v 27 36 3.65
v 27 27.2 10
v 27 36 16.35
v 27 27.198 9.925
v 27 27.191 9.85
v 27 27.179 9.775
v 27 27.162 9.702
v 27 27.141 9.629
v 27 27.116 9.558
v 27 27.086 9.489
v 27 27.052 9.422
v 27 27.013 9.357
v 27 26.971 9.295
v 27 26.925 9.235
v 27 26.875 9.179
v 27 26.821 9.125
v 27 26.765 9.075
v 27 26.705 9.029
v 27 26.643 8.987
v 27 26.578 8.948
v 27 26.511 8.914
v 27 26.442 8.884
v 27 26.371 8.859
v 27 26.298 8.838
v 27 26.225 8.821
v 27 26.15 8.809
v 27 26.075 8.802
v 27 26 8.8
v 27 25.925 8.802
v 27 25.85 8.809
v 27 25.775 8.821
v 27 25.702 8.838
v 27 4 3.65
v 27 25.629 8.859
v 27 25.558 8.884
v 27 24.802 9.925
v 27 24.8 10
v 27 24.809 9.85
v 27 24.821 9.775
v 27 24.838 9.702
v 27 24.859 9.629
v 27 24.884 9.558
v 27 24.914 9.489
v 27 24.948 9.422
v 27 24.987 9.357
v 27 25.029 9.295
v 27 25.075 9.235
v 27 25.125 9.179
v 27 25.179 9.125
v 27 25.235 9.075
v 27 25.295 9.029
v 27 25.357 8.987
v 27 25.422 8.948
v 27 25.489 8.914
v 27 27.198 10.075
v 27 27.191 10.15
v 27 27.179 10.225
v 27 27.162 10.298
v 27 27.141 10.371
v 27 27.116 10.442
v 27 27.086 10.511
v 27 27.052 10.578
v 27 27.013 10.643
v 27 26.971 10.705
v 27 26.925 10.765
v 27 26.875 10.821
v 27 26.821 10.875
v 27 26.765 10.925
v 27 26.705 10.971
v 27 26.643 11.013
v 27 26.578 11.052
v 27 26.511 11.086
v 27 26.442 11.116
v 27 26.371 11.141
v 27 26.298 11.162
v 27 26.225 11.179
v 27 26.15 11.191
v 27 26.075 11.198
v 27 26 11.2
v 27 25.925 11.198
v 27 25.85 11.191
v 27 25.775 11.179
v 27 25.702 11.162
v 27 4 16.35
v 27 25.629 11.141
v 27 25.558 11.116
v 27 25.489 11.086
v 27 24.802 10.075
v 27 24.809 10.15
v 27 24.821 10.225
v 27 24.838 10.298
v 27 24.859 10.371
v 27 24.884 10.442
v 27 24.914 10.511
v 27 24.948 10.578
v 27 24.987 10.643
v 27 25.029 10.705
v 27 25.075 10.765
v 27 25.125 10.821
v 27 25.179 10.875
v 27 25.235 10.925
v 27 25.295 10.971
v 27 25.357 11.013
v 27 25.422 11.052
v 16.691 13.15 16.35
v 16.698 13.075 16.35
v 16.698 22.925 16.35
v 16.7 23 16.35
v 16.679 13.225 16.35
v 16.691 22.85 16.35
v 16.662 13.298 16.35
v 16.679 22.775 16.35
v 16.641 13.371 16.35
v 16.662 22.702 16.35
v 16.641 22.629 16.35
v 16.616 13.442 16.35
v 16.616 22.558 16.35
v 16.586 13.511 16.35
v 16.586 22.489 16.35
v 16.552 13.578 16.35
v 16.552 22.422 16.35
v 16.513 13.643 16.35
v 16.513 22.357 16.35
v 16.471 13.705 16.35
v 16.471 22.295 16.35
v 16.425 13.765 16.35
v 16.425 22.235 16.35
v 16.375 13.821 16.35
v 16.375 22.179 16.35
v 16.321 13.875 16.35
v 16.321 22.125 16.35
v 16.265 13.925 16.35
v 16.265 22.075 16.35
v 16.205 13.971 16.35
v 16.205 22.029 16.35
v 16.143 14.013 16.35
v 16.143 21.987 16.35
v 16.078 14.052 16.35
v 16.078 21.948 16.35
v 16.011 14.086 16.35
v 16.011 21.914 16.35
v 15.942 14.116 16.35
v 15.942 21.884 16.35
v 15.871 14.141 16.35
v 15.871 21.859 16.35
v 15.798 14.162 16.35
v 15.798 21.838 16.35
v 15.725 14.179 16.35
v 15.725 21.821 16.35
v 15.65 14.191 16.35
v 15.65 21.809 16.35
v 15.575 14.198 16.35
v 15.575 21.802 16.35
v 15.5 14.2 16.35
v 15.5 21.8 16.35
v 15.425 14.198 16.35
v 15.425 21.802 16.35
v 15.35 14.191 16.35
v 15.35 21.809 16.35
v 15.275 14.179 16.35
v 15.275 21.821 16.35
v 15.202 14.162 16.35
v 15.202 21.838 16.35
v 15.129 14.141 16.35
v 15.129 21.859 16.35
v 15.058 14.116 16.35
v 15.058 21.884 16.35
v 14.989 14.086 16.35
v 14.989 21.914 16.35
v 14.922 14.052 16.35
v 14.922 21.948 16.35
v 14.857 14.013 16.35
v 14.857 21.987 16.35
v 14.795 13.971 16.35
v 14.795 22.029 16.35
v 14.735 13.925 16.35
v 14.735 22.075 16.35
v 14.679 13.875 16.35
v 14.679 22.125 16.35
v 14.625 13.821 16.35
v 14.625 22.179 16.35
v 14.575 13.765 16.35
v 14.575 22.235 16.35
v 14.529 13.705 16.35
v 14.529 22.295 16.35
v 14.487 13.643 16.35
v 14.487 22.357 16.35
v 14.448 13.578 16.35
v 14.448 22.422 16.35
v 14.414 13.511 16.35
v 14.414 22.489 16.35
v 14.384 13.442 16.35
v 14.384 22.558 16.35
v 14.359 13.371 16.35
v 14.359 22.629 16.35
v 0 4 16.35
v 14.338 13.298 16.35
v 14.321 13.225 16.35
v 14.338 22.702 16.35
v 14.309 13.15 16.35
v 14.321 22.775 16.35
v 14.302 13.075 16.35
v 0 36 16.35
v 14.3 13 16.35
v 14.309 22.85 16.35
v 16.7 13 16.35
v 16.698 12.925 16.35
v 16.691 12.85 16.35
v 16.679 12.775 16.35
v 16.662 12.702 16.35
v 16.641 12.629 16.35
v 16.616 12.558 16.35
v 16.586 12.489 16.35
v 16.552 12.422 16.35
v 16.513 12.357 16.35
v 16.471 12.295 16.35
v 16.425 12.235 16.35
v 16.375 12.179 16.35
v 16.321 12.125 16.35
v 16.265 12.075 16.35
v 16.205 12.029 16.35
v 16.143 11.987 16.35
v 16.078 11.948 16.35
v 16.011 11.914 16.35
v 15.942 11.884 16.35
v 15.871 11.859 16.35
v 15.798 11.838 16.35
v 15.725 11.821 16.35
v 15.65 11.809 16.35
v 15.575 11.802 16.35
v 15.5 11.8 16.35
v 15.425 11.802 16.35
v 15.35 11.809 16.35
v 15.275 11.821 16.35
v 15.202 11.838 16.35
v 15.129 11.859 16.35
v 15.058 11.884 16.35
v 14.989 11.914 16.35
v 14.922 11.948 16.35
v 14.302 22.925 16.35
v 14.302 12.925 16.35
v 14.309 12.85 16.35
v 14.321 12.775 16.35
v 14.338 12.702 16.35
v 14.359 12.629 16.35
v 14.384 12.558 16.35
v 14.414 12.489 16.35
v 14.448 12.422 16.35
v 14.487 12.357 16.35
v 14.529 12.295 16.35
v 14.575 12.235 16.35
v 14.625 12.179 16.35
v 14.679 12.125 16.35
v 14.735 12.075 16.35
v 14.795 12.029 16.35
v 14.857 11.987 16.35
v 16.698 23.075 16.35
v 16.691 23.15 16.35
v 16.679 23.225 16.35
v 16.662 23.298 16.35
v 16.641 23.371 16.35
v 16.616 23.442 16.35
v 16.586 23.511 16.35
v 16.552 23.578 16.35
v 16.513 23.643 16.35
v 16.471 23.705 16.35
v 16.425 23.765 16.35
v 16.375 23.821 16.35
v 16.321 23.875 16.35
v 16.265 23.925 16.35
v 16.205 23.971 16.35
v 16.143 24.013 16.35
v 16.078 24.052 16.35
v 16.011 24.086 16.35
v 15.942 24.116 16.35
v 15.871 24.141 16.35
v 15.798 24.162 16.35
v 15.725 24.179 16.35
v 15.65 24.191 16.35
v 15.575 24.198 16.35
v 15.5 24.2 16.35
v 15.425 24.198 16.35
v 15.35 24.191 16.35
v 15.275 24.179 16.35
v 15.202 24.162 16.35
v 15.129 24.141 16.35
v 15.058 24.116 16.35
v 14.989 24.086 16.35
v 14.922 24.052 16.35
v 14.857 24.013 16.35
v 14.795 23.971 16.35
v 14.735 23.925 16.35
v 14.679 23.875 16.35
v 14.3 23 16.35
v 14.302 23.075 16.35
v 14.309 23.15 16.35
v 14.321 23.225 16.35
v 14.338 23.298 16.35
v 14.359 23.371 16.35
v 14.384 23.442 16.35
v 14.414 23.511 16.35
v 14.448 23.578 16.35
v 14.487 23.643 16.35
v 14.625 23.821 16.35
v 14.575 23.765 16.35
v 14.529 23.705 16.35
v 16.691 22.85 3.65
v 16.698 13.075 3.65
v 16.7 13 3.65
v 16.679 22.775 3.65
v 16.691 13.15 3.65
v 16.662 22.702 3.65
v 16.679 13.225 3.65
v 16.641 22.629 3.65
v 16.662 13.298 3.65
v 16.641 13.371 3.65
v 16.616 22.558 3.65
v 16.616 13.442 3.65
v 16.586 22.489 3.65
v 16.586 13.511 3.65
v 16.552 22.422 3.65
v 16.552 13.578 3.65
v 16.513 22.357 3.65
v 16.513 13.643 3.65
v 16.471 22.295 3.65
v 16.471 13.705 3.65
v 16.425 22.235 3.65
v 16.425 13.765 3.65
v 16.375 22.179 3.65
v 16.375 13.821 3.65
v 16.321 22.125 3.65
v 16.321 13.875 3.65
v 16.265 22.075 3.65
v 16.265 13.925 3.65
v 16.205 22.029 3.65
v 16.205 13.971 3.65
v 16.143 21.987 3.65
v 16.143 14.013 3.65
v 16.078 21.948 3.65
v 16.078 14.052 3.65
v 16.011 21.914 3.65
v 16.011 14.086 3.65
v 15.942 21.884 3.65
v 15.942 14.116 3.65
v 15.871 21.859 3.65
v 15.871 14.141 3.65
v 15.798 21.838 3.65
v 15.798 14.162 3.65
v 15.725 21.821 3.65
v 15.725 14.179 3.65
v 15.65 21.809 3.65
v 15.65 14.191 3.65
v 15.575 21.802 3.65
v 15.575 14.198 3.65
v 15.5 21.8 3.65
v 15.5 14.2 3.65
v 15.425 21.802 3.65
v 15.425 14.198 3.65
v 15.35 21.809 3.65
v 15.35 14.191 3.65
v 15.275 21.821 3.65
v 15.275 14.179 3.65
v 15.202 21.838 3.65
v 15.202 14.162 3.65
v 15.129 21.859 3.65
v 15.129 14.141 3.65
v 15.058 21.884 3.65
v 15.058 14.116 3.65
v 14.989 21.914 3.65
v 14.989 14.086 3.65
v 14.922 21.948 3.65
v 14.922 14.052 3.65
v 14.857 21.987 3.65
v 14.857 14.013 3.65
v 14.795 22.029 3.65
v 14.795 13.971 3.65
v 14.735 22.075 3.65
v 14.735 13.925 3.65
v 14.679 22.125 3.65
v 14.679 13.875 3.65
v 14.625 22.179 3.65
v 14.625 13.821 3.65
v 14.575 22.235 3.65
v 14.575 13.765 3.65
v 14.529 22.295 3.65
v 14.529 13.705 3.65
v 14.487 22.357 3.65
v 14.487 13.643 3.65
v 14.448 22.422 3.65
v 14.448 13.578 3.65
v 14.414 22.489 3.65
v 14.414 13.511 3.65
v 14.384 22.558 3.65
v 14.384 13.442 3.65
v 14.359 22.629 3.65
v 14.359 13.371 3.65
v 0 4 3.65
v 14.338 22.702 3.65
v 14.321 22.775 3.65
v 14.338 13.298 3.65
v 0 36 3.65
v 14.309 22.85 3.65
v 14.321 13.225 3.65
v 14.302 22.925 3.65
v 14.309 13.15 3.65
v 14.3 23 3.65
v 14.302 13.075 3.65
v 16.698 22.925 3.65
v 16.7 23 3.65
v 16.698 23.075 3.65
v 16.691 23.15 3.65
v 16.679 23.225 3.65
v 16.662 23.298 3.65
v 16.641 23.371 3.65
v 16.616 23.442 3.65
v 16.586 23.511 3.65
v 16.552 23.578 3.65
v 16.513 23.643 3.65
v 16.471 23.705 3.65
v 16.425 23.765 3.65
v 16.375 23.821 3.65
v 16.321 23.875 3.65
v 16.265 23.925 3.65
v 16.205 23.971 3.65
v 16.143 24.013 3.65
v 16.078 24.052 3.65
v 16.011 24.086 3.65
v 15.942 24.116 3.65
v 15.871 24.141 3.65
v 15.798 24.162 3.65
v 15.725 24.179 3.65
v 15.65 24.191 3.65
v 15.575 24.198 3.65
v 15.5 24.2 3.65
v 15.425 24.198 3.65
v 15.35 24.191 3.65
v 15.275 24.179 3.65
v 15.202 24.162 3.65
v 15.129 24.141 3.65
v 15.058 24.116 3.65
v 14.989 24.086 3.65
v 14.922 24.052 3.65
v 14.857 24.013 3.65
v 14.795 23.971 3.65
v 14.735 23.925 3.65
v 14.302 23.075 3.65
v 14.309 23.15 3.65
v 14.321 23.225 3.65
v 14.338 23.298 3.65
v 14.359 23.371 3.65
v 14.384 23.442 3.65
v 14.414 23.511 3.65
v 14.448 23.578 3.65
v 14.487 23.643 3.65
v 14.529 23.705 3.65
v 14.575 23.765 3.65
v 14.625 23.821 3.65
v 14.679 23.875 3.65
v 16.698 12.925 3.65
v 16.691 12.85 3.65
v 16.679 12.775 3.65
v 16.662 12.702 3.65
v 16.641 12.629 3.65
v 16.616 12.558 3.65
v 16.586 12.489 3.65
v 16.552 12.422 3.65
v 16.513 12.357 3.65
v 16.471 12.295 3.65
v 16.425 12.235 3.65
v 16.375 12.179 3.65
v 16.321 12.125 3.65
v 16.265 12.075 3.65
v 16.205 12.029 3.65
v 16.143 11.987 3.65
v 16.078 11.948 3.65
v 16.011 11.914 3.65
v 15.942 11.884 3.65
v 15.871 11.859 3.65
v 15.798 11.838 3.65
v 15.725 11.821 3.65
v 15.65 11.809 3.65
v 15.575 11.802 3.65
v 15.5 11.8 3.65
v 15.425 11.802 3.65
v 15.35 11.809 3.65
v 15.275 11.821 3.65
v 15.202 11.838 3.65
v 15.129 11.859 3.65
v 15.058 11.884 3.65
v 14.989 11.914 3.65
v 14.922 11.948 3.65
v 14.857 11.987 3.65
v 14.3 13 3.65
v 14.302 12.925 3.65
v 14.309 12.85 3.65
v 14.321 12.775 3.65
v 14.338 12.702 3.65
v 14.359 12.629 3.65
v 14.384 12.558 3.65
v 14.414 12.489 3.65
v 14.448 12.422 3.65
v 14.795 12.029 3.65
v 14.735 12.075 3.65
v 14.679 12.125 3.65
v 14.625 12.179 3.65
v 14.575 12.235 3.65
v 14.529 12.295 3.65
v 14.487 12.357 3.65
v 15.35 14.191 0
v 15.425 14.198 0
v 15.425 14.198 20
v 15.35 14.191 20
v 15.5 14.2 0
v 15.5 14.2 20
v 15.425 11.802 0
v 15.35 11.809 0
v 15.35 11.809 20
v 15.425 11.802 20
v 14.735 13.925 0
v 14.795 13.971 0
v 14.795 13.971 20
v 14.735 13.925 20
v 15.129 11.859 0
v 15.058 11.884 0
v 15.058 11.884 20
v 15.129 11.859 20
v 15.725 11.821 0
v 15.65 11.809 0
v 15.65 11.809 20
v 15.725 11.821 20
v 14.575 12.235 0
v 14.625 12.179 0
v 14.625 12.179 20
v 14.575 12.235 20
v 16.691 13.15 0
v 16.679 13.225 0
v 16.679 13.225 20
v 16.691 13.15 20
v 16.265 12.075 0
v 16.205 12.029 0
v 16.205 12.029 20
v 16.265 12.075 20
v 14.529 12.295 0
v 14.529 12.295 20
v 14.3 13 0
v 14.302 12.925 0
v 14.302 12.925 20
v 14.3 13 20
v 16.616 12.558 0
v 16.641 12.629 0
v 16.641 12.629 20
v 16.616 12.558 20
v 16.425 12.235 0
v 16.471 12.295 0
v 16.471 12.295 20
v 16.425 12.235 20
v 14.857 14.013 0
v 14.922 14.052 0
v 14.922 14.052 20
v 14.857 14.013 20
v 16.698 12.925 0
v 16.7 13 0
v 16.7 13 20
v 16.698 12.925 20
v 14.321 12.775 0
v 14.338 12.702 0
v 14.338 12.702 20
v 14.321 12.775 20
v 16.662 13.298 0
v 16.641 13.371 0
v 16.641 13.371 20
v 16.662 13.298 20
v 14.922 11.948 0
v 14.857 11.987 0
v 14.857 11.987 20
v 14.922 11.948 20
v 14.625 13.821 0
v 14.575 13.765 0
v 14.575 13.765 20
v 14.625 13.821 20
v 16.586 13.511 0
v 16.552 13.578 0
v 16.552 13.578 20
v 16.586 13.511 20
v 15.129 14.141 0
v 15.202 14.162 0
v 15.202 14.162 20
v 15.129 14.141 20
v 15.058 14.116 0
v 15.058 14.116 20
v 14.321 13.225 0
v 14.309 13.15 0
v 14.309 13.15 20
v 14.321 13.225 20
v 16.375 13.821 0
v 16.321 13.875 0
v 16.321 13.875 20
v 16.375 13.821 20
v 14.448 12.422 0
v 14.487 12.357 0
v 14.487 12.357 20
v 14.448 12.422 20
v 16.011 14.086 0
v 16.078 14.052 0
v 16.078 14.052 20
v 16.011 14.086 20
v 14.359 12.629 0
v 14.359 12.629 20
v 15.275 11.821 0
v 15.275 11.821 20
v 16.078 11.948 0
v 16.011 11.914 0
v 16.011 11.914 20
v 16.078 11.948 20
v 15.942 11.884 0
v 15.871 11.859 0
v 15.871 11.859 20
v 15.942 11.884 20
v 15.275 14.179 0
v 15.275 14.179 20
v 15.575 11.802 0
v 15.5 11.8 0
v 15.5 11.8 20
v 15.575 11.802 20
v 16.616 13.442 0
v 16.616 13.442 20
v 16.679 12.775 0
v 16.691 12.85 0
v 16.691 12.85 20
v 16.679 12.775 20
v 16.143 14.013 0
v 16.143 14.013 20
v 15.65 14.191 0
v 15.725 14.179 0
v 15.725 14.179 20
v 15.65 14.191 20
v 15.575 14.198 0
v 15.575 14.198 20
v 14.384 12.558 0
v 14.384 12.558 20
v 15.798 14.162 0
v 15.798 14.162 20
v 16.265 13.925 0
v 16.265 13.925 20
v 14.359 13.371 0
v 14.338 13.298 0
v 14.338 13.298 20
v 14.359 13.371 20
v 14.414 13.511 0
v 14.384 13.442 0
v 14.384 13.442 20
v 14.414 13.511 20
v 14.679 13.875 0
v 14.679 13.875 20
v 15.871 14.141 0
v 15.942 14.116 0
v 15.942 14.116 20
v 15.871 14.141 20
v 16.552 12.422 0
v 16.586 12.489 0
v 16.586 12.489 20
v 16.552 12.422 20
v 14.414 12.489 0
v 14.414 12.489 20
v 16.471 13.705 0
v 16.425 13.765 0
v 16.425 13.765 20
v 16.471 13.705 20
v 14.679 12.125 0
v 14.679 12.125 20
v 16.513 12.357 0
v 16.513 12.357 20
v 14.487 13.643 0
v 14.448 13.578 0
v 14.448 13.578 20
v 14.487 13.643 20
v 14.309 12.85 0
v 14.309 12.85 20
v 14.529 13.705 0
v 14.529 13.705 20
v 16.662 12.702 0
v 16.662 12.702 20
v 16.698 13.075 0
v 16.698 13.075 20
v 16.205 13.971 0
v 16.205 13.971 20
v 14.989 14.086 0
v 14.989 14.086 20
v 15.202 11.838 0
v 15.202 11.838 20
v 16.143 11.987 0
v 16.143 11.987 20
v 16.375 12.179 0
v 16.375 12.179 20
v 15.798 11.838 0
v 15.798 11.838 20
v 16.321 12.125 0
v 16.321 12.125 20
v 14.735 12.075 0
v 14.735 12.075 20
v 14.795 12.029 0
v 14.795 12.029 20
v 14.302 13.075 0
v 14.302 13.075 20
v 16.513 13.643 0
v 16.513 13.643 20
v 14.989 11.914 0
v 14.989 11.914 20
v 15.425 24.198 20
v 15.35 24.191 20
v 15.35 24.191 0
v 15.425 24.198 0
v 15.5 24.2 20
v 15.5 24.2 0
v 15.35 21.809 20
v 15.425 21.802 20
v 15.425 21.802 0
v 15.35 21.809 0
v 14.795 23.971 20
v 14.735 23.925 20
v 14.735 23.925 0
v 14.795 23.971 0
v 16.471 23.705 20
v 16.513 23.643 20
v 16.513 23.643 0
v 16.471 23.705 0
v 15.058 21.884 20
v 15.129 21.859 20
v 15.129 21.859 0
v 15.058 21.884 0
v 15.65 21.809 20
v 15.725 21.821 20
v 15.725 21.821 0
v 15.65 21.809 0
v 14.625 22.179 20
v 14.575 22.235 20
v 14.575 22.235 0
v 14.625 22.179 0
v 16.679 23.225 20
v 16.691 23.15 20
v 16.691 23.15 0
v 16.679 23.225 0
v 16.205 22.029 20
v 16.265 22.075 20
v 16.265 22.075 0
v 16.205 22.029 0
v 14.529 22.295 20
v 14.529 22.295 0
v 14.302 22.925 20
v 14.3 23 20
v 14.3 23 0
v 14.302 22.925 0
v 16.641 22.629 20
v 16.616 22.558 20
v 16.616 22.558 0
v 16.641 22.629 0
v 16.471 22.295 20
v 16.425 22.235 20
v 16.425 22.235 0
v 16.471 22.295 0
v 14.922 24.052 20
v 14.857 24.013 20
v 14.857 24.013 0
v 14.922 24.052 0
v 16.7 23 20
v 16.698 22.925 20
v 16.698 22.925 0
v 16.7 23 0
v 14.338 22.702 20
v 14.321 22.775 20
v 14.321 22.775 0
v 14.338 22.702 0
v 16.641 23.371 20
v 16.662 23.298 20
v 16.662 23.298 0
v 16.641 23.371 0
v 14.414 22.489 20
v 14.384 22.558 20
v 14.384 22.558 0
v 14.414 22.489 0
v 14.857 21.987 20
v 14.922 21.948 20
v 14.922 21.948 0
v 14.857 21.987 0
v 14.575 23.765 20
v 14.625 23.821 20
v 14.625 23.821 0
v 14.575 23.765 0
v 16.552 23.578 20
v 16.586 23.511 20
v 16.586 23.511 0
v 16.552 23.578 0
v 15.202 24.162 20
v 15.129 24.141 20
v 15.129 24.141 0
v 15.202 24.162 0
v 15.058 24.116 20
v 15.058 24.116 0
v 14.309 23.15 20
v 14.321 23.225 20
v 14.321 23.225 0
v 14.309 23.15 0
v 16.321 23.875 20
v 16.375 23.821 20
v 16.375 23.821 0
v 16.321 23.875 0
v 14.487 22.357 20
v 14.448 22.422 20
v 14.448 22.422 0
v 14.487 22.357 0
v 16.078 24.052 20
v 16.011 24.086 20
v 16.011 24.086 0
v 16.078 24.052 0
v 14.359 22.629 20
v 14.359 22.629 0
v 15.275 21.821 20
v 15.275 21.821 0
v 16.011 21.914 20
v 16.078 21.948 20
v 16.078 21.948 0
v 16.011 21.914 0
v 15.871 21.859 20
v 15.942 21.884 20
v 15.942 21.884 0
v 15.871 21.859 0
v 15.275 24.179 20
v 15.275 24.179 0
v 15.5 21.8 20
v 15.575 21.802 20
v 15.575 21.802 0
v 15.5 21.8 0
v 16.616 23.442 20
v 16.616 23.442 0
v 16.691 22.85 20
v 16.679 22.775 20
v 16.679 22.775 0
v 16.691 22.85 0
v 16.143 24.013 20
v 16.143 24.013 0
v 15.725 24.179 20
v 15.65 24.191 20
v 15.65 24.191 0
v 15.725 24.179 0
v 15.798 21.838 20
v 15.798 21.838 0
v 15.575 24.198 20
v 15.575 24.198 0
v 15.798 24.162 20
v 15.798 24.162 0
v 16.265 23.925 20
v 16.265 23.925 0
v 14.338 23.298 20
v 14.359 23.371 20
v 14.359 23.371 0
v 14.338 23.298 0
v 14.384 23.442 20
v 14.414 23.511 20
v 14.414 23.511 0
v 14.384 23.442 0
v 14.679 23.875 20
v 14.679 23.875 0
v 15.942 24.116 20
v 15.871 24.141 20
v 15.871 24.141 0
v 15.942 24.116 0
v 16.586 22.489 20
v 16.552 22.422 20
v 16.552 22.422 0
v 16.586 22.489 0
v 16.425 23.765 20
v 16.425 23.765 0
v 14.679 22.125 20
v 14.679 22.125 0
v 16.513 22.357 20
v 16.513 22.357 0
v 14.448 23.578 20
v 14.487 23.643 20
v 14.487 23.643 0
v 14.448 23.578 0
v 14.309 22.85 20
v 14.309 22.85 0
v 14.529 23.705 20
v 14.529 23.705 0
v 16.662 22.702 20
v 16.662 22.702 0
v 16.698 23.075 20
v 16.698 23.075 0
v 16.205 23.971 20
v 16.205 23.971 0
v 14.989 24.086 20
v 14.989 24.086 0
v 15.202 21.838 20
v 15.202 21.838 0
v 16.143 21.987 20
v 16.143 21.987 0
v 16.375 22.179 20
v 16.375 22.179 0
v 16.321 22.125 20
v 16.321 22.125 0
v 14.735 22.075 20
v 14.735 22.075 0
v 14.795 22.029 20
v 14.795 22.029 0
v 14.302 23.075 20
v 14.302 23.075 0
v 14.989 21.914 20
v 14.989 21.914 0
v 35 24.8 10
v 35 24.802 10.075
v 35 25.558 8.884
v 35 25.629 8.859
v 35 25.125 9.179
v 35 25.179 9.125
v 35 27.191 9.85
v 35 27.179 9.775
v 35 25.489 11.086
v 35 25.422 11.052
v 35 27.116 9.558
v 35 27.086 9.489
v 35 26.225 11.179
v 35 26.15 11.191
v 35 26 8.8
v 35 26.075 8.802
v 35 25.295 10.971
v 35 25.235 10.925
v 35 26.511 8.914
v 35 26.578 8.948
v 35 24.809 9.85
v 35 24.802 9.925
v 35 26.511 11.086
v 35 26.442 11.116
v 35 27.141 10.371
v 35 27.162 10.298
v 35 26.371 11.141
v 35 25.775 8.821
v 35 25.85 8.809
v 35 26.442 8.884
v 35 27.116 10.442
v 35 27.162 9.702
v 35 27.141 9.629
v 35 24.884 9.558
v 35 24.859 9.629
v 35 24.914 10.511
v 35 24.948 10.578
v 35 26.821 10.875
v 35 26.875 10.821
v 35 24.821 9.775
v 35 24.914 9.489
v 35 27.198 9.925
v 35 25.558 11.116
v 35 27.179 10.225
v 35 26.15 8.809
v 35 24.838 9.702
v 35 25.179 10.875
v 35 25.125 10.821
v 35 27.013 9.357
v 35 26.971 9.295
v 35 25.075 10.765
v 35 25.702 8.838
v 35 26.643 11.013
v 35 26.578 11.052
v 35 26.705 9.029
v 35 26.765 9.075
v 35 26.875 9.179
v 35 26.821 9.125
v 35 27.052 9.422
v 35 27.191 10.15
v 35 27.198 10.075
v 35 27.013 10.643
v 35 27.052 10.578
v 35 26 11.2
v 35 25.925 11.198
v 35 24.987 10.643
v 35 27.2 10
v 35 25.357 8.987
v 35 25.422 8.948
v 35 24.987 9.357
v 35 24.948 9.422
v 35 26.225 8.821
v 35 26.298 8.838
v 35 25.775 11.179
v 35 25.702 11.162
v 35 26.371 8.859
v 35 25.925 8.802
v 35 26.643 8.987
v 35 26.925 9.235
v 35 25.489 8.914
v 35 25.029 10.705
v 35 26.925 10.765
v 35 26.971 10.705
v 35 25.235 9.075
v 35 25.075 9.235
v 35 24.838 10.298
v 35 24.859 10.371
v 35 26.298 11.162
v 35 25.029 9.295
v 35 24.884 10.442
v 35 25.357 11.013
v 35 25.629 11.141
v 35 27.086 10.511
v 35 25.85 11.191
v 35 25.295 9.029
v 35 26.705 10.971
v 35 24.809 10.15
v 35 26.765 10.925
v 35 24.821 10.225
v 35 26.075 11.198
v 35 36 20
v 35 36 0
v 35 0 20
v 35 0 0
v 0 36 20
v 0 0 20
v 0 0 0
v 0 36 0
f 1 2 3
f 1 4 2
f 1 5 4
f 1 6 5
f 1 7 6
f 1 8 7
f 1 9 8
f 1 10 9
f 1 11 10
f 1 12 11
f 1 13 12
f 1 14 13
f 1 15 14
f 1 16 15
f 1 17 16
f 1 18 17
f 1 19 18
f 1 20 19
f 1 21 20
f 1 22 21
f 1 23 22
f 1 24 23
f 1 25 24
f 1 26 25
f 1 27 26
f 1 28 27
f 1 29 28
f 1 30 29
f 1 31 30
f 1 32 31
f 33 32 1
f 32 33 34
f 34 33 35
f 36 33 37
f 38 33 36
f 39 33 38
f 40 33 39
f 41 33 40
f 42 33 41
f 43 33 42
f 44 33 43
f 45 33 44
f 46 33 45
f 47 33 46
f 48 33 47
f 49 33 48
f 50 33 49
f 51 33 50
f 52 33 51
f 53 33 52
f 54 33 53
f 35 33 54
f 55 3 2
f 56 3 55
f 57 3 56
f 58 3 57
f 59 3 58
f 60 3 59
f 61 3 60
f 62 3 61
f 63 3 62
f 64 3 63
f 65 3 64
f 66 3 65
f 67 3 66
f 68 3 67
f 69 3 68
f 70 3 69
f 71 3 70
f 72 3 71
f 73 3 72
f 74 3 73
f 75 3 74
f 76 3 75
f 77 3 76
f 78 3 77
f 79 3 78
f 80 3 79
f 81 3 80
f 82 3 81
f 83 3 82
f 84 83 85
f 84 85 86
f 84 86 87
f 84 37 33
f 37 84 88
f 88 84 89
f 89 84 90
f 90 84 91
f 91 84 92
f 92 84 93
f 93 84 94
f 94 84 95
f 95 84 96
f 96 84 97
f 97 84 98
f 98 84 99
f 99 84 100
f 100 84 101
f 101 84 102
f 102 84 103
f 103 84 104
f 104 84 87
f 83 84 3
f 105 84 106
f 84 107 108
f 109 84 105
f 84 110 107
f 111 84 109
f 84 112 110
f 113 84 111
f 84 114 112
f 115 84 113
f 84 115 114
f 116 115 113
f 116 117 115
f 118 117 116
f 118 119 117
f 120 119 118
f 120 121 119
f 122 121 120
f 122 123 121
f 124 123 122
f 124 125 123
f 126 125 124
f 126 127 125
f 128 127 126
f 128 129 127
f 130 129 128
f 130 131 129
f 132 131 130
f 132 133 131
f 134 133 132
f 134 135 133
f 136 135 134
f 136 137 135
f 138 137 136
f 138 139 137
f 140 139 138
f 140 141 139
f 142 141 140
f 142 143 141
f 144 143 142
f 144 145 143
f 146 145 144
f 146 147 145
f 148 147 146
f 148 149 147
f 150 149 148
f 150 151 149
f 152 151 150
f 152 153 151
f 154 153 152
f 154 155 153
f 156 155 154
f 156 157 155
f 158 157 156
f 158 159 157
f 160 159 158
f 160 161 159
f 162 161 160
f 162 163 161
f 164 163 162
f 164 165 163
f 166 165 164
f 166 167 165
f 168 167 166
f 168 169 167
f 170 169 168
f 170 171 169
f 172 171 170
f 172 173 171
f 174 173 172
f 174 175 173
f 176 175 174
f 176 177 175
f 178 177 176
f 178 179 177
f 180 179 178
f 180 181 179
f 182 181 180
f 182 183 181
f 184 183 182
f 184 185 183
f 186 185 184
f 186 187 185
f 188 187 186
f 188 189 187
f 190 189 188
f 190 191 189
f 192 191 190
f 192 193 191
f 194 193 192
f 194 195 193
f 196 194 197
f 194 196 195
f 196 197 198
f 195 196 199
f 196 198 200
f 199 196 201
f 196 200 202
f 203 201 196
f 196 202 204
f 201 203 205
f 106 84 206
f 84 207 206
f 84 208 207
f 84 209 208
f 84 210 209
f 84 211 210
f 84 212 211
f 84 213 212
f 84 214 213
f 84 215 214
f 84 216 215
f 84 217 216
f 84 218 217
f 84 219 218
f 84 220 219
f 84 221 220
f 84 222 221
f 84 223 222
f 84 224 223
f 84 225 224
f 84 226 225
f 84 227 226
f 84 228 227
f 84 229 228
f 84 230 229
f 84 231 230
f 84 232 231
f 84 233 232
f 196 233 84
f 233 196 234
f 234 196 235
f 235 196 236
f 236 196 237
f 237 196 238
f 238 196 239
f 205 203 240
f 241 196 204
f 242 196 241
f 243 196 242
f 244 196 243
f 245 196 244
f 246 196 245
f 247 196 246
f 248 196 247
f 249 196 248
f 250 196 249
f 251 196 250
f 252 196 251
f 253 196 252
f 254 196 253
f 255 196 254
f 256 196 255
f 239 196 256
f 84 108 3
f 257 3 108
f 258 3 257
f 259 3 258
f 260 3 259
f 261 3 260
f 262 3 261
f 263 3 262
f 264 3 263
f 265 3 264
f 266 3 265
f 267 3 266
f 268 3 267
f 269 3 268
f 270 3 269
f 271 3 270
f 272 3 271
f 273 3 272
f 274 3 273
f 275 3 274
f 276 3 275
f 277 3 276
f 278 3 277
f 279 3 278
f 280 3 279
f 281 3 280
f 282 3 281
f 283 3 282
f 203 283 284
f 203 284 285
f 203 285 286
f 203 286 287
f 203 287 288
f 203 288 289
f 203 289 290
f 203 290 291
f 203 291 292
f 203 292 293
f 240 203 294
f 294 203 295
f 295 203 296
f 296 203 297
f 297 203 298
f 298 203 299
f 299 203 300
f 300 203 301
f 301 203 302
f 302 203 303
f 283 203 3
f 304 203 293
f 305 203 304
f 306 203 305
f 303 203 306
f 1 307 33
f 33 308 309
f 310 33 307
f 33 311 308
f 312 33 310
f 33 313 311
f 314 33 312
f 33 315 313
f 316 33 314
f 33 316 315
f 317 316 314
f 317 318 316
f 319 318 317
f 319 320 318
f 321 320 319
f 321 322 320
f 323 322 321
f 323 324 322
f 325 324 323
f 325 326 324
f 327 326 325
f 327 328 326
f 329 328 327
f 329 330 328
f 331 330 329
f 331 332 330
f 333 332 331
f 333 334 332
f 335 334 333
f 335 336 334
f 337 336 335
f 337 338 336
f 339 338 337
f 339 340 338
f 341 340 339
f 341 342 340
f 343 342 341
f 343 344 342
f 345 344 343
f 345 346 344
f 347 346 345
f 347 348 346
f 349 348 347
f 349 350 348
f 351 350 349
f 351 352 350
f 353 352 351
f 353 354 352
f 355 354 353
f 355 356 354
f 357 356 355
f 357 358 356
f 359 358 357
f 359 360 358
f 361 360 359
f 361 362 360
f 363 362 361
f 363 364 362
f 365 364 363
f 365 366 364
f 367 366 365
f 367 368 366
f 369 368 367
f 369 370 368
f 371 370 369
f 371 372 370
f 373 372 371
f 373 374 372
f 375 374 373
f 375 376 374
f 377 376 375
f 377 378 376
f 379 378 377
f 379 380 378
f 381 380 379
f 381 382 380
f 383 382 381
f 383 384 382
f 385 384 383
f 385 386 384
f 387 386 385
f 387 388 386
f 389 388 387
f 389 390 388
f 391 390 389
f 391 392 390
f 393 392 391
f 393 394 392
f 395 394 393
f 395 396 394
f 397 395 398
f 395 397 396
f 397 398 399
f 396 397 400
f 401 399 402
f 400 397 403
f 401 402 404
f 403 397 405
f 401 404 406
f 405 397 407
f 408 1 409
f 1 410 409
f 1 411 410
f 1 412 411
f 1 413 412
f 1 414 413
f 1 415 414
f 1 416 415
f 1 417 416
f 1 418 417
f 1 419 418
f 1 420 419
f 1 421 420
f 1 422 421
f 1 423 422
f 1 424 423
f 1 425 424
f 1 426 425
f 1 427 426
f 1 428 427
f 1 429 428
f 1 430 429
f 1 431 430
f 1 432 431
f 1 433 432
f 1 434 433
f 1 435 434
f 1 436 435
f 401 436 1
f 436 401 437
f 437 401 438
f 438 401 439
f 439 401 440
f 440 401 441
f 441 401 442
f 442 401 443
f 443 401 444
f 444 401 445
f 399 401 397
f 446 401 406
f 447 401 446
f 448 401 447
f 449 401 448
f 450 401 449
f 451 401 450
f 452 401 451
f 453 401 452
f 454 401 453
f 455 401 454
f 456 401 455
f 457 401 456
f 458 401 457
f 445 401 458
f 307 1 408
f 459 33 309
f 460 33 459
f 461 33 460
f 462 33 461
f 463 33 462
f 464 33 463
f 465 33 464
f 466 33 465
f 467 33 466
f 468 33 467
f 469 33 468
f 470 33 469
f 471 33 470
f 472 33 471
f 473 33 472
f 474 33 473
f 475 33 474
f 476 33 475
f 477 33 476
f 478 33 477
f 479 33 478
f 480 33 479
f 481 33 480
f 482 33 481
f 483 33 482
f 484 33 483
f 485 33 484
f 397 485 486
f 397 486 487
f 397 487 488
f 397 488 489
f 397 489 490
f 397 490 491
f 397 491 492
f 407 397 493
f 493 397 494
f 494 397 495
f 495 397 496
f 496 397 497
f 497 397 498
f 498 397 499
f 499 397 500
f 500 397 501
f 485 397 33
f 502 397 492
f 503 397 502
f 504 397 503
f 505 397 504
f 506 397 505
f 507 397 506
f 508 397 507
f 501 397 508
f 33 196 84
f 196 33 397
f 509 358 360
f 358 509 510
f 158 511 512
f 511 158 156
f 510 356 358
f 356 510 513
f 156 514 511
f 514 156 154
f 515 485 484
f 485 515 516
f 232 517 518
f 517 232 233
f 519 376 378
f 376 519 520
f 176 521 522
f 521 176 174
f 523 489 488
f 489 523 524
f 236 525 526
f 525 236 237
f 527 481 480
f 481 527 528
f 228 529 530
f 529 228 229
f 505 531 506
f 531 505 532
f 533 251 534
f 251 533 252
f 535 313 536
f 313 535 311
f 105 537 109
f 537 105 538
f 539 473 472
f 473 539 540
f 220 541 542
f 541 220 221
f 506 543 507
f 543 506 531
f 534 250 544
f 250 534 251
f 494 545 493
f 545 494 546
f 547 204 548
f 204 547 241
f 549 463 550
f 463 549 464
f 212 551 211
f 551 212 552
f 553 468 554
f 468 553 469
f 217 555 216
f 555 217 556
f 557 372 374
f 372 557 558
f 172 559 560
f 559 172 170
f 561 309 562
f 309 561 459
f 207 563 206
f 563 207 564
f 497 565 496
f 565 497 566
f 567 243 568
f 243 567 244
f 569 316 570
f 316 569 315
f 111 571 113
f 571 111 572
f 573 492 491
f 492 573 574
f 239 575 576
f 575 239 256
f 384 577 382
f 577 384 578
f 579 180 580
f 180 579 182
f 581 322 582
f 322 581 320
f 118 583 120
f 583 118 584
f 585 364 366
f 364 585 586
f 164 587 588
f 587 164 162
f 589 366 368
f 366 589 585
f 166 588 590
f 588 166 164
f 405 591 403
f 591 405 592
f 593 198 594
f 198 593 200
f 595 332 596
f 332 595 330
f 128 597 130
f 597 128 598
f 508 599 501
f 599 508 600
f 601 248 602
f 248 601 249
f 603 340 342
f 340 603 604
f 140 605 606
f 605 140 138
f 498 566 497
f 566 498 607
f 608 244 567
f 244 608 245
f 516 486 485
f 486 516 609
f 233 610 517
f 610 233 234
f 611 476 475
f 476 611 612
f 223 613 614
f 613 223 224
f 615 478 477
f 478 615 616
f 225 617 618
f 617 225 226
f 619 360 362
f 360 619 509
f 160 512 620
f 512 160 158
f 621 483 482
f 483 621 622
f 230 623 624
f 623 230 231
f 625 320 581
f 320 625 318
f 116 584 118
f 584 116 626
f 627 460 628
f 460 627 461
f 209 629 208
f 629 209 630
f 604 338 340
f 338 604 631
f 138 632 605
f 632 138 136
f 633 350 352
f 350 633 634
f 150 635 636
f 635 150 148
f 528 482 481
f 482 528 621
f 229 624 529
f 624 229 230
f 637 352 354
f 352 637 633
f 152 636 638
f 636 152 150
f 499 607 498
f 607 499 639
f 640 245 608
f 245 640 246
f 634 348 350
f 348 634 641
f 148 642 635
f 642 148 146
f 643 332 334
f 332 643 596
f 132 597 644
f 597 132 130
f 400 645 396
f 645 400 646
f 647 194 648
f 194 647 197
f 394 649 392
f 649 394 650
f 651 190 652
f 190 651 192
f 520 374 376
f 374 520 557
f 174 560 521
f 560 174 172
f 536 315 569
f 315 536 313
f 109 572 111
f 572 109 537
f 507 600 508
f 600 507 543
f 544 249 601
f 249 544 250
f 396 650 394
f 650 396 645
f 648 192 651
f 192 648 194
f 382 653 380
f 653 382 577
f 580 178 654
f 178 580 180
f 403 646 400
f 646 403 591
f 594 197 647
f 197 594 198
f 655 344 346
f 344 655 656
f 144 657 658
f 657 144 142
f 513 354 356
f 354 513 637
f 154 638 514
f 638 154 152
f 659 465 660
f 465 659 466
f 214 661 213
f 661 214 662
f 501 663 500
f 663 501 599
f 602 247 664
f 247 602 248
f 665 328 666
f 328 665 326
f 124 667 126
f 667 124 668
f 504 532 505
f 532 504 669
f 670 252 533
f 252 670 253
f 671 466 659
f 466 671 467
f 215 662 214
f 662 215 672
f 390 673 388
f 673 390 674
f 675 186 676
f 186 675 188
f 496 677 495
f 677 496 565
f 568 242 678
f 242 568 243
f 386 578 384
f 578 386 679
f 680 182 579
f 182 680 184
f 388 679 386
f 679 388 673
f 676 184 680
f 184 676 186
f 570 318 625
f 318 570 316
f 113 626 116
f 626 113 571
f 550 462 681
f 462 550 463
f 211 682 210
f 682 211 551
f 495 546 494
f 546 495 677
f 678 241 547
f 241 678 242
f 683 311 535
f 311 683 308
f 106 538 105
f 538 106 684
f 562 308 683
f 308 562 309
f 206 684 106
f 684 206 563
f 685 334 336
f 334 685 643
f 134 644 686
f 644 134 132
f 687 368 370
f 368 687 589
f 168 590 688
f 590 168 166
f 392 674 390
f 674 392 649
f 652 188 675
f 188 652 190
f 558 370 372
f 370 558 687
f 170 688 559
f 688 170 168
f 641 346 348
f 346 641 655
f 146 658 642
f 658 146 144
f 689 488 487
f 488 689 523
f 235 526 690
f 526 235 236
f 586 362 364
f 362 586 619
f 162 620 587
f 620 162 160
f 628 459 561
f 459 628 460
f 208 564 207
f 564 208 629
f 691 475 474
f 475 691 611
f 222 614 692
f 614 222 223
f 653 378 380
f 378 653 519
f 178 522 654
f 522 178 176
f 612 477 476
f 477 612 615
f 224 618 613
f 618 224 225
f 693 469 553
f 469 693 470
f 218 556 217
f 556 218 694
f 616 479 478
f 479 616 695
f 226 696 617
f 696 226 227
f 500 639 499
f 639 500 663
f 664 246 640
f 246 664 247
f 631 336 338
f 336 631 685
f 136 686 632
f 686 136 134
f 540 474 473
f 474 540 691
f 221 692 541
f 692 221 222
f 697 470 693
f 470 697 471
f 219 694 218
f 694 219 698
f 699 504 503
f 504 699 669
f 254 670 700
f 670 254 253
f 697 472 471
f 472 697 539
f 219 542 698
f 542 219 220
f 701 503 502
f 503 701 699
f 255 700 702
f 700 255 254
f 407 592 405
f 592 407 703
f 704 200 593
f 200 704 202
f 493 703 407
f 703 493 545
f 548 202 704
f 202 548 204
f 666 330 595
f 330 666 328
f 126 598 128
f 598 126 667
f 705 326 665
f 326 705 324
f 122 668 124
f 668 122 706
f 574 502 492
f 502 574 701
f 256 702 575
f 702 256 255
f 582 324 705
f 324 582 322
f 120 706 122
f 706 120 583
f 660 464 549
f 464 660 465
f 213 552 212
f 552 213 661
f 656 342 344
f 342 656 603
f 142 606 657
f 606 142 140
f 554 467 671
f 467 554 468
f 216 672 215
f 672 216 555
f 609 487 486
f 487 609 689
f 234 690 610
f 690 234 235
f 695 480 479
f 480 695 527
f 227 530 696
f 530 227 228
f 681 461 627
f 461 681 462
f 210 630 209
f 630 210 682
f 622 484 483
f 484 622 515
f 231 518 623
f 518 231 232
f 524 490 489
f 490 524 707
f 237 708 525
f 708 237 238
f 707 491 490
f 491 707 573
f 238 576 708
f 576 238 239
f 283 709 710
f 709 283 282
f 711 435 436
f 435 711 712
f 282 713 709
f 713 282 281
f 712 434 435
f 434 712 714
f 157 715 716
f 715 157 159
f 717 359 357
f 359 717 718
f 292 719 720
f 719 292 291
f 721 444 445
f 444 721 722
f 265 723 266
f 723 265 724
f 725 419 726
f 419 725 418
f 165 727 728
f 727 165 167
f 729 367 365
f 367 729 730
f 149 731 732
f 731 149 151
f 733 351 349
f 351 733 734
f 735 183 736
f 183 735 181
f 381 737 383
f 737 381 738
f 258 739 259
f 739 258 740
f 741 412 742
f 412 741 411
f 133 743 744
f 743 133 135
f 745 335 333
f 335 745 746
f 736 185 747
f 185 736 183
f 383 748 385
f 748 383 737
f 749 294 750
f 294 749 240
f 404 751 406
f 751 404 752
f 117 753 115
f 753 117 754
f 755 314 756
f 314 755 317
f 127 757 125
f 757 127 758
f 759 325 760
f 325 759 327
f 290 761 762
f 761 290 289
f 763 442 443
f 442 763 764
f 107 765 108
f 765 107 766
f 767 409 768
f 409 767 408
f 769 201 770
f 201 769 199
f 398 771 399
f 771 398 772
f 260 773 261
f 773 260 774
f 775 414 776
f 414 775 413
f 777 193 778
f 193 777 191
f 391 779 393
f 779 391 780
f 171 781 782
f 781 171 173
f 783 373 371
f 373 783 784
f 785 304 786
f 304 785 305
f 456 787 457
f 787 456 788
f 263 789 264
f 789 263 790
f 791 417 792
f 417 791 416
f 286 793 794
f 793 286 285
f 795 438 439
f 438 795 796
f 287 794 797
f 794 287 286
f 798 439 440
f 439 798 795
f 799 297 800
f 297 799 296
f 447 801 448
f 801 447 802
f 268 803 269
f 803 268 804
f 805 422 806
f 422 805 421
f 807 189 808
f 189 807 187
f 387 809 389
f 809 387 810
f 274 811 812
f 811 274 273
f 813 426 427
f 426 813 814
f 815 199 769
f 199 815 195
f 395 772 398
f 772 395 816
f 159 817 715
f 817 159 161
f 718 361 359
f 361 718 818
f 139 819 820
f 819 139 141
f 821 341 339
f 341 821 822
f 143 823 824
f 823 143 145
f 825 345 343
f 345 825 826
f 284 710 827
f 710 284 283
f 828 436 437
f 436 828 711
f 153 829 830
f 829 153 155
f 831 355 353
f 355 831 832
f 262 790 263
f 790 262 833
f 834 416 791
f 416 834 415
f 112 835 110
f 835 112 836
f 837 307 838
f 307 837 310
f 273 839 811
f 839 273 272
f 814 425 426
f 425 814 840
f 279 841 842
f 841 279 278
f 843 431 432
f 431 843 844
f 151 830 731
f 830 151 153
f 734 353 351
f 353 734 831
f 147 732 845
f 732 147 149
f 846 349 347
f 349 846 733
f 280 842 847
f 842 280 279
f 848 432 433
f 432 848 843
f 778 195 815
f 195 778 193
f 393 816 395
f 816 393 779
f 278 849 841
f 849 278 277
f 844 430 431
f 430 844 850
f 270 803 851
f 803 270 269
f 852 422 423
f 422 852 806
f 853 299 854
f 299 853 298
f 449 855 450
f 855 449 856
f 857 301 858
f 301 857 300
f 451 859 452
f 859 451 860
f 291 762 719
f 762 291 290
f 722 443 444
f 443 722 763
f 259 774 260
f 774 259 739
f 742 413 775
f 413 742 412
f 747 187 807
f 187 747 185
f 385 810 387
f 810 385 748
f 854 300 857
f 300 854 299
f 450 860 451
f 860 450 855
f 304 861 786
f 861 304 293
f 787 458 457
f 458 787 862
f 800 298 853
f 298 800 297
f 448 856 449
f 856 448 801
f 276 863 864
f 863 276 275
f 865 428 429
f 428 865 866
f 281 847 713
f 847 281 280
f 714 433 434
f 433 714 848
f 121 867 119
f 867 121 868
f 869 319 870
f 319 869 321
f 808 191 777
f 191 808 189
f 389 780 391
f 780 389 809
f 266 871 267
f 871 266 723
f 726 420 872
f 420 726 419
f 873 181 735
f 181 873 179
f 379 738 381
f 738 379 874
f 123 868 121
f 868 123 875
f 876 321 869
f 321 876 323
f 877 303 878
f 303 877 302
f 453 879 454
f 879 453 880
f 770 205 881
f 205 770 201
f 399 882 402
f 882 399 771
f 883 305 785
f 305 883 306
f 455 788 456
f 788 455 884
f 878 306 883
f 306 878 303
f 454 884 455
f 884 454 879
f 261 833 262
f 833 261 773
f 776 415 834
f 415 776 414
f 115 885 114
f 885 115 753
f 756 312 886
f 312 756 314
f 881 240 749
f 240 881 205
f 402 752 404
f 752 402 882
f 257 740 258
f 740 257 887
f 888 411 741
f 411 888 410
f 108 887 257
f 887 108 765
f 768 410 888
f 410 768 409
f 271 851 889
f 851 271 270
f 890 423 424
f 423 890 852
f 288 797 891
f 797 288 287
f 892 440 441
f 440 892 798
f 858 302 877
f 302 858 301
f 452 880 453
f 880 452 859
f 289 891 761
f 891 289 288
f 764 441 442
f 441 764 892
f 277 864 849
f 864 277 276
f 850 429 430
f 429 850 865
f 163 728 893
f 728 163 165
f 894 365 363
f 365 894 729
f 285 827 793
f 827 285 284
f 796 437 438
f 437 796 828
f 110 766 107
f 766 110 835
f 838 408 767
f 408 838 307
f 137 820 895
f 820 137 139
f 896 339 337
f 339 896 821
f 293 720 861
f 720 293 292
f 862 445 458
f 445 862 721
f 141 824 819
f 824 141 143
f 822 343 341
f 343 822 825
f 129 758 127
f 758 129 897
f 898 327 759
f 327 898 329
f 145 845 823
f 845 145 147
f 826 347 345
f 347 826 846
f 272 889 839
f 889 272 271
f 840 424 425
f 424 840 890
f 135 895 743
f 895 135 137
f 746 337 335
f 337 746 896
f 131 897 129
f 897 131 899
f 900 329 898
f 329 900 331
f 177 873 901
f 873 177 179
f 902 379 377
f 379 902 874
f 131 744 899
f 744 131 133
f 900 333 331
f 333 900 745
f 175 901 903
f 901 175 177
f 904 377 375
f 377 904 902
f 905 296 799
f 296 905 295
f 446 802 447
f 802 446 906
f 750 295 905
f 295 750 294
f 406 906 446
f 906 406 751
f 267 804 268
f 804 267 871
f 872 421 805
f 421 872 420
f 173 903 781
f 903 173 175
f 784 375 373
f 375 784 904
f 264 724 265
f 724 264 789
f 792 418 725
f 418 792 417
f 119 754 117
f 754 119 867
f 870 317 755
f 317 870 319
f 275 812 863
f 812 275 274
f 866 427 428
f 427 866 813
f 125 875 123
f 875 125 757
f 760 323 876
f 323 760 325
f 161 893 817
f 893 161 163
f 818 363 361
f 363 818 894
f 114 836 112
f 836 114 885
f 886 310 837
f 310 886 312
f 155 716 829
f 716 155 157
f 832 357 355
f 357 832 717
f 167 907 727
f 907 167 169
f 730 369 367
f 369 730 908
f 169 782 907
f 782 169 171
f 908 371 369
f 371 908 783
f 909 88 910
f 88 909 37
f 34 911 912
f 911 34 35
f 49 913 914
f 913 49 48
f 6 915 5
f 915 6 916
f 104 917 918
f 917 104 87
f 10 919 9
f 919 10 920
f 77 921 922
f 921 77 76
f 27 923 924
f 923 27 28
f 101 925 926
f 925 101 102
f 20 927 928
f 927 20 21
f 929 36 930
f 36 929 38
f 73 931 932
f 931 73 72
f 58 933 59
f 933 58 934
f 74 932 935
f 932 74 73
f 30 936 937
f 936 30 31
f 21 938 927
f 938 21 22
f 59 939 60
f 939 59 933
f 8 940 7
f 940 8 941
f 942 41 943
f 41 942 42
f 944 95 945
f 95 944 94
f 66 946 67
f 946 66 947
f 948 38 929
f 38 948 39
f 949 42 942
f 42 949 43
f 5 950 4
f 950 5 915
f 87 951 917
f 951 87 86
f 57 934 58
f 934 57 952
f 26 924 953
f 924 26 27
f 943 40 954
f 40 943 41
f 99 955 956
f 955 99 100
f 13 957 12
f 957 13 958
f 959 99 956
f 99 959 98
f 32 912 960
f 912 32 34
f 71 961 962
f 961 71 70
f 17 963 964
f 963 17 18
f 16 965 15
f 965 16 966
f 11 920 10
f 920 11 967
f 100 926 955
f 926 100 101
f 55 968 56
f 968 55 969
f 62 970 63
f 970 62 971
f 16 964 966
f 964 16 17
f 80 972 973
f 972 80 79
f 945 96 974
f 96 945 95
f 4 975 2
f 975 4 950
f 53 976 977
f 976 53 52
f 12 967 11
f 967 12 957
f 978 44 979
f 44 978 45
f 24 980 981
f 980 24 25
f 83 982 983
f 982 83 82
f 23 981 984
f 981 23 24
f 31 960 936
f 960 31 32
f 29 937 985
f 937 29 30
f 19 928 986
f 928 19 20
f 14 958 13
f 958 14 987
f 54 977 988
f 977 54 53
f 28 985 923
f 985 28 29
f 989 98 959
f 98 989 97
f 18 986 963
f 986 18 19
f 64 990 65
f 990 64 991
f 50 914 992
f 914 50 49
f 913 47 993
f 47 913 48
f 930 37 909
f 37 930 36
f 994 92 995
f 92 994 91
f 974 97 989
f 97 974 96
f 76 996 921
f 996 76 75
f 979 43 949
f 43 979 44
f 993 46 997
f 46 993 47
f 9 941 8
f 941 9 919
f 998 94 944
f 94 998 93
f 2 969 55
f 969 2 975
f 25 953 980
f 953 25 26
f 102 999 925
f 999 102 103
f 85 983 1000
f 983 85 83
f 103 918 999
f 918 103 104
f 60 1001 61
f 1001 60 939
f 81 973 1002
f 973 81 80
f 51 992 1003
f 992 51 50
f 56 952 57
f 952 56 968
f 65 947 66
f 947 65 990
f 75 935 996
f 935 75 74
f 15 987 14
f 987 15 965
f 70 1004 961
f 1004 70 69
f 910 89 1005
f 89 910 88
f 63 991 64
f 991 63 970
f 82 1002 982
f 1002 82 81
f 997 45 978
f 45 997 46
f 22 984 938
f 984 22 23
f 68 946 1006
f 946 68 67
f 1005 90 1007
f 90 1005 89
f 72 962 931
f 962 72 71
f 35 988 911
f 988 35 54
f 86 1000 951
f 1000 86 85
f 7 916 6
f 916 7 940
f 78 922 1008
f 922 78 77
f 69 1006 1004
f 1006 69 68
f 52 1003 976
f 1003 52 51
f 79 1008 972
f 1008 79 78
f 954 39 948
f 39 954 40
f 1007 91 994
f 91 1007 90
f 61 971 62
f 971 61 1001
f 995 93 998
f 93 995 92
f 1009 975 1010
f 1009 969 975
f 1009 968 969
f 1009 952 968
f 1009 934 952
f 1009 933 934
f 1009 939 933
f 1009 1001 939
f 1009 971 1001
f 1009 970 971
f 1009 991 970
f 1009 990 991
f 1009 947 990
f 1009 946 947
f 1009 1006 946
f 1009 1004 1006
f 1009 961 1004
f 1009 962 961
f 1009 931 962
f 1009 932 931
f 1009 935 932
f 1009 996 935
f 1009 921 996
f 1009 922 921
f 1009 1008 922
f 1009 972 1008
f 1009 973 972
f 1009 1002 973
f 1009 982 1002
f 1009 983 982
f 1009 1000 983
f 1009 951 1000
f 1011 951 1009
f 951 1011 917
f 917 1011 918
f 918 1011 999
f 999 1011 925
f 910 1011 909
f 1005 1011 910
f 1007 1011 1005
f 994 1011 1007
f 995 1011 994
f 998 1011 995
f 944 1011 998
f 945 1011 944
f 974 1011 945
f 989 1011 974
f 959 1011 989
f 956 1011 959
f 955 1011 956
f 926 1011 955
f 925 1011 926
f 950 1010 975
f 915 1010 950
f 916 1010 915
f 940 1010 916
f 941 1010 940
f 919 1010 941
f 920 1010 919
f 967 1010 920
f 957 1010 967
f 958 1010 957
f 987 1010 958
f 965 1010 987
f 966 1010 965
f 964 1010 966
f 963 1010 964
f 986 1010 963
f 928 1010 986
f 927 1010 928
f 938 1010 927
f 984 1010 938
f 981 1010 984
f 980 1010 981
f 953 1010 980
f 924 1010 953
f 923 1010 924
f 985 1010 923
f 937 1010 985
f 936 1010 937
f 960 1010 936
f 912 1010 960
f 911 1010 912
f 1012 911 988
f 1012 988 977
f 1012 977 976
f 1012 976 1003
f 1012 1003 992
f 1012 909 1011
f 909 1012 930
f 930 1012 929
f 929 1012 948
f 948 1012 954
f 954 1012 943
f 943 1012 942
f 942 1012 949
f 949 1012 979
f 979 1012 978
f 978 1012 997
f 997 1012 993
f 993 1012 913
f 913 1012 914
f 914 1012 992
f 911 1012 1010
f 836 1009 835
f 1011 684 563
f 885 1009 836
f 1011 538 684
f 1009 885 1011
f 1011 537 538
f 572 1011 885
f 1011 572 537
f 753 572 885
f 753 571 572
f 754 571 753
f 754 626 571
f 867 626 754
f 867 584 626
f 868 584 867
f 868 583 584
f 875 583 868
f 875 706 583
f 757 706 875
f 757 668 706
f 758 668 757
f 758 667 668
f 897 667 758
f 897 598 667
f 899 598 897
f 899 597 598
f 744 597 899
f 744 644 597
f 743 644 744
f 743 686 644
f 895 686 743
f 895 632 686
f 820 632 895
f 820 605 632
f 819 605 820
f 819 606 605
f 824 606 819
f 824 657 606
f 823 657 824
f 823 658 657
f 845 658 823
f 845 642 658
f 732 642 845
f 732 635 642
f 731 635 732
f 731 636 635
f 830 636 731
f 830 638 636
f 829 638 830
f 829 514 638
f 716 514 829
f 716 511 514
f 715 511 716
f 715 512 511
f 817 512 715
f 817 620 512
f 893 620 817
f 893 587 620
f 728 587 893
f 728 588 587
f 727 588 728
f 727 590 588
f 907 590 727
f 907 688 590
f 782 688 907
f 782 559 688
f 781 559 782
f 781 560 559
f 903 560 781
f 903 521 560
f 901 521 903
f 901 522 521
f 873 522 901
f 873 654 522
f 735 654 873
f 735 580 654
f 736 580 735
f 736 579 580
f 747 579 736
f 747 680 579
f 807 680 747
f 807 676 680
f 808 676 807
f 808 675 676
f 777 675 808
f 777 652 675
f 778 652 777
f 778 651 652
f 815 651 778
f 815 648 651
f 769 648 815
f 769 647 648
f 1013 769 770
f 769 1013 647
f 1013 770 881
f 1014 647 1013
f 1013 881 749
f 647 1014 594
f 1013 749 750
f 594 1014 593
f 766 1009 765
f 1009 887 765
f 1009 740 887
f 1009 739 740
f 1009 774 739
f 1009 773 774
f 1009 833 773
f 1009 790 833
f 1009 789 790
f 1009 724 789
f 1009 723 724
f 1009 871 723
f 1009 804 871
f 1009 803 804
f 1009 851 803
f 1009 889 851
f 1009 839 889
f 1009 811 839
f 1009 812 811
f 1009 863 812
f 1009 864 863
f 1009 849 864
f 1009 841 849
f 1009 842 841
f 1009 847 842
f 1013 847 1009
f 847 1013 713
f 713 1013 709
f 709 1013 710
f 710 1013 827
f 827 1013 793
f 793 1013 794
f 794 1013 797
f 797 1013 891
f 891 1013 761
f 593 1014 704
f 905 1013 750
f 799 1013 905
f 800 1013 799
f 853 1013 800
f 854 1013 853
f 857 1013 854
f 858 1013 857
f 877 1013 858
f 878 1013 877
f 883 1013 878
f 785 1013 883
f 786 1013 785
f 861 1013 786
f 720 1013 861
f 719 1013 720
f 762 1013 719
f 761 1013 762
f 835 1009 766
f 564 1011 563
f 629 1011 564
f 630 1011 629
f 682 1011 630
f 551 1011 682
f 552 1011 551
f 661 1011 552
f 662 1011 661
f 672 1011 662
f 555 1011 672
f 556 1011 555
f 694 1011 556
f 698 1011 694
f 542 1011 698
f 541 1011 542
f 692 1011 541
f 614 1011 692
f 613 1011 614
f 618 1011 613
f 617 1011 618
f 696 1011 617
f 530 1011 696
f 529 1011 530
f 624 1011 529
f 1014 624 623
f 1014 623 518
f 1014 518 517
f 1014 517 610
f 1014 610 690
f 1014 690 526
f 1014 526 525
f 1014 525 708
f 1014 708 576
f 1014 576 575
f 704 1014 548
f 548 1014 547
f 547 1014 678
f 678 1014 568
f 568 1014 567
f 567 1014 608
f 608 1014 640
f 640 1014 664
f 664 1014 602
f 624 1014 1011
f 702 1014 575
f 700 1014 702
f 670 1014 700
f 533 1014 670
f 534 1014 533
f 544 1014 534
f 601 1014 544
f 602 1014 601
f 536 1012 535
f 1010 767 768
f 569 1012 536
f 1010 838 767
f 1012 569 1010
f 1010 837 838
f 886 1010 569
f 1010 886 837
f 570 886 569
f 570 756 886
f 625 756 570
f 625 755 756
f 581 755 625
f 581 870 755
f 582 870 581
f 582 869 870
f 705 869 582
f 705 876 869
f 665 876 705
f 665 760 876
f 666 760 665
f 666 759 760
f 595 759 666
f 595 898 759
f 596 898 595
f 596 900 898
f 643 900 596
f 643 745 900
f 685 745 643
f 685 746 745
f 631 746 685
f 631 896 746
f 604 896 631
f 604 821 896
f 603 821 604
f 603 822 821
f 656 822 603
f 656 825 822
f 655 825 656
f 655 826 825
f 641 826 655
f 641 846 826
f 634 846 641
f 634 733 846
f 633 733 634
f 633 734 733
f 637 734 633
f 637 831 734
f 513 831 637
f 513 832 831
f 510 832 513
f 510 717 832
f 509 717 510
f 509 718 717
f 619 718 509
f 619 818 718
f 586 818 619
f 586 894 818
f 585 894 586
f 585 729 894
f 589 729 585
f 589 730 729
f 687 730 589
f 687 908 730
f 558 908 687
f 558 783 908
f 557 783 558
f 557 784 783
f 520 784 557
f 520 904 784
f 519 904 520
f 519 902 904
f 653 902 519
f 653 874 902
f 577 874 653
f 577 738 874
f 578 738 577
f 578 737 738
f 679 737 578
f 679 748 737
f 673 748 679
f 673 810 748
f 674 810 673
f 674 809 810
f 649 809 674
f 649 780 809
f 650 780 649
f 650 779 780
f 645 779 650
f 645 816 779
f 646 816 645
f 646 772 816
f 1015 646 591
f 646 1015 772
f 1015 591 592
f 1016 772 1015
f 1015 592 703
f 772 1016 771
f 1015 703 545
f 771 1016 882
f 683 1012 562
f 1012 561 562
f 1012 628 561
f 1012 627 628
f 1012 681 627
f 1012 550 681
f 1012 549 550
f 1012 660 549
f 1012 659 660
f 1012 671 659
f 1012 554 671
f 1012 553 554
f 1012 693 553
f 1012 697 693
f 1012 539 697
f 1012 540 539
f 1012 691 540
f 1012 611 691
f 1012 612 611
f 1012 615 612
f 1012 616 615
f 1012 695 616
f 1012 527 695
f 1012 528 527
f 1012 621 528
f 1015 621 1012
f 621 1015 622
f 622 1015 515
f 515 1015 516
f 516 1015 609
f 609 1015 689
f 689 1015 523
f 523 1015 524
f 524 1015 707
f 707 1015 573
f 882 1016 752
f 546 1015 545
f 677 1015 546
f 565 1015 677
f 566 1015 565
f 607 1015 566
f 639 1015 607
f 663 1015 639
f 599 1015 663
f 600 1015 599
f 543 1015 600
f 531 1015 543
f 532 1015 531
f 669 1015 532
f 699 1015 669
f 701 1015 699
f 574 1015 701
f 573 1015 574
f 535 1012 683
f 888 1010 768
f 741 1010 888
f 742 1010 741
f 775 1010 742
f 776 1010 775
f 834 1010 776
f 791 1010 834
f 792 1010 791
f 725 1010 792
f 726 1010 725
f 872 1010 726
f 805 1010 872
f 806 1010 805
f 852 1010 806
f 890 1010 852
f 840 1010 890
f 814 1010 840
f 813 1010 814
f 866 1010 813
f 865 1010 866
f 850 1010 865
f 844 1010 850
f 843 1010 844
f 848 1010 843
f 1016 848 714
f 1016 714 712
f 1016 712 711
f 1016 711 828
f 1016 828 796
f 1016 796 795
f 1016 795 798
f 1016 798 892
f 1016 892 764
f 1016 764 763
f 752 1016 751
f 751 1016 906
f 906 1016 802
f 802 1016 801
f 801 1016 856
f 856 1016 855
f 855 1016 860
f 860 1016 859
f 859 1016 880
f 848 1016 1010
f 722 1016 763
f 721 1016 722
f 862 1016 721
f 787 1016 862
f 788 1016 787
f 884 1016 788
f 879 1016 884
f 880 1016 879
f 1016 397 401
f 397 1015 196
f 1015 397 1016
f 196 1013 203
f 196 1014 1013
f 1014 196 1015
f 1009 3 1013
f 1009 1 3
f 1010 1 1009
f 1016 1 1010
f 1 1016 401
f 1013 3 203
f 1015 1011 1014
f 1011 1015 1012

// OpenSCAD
difference(){
	union(){
        
       translate([0,0,0]){
           cube([31+4,36,20], center=false);
       }


       
	
	}
	union() {
       translate([-4,4,(20-12.7)/2]){
           cube([31,36,12.7], center=false);
       }

       translate([31/2,36/2-5,-2]){
            rotate(a = [0,0,90]) {
              cylinder(h=600, r=1.2, $fn=100, center=false);
            }
       }	
       translate([31/2,36/2+5,-2]){
            rotate(a = [0,0,90]) {
              cylinder(h=600, r=1.2, $fn=100, center=false);
            }
       }	
       translate([0,36-10,10]){
            rotate(a = [0,90,0]) {
              cylinder(h=600, r=1.2, $fn=100, center=false);
            }
       }	
       
	}
}
